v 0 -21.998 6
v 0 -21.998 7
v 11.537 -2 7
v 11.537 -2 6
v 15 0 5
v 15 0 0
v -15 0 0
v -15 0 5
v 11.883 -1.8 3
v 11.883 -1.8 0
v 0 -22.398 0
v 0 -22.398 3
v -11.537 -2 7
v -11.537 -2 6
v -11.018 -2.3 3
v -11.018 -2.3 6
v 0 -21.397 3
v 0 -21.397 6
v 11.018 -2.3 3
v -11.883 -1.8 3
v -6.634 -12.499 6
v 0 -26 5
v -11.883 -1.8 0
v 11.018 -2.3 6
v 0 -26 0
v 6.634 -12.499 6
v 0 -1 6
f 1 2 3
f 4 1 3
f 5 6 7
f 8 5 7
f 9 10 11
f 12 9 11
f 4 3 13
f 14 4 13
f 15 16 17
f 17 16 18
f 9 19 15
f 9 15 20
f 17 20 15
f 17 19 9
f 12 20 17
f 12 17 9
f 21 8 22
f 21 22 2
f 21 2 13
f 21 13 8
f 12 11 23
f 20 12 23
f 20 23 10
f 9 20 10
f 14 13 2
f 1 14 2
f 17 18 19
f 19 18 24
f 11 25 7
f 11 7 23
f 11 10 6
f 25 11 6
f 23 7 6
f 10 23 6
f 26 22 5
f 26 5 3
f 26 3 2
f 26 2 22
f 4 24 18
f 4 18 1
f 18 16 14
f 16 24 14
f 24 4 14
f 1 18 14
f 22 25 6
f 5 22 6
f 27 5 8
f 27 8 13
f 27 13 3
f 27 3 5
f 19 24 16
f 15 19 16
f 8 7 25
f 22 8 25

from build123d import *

# Parameters (mm, degrees)
F1_DEPTH = 5
F6_DEPTH = 1
F8_DEPTH = 3
F9_DEPTH = 3


with BuildPart() as f1:
    # F0 (on Top) → F1 (new body)
    with BuildSketch(Plane.XY):
        Polygon((15, 0), (-15, 0), (0, -26), align=None)
    extrude(amount=F1_DEPTH)

    # F1_face (on face) → F4 section 0
    with BuildSketch(Plane(origin=(0, -8.6666666667, 5), x_dir=(1, 0, 0), z_dir=(0, 0, 1))):
        Polygon((15, 8.6666666667), (-15, 8.6666666667), (0, -17.3333333333), align=None)
    # F3 (on offset) → F4 section 1
    with BuildSketch(Plane.XY.offset(7)):
        Polygon((0, -21.9977783947), (11.5371798431, -2), (-11.5371798431, -2), align=None)
    loft()

    # F6 (cut): a face of the model
    f6_faces = [f1.faces().sort_by_distance(p)[0] for p in [
        (0, -8.6659261316, 7),
    ]]
    extrude(f6_faces, amount=-F6_DEPTH, mode=Mode.SUBTRACT)

    # F7 (on face) → F8 (cut)
    with BuildSketch(Plane.XY.offset(6)):
        Polygon((0, -21.3974451539), (11.0177568196, -2.3), (-11.0177568196, -2.3), align=None)
    extrude(amount=-F8_DEPTH, mode=Mode.SUBTRACT)

    # F5 (on face) → F9 (cut, through all)
    with BuildSketch(Plane(origin=(0, 0, 0), x_dir=(1, 0, 0), z_dir=(0, 0, -1))):
        Polygon((0, 22.3980005552), (-11.8834618588, 1.8), (11.8834618588, 1.8), align=None)
    extrude(amount=-F9_DEPTH, mode=Mode.SUBTRACT)


solid = f1.part
